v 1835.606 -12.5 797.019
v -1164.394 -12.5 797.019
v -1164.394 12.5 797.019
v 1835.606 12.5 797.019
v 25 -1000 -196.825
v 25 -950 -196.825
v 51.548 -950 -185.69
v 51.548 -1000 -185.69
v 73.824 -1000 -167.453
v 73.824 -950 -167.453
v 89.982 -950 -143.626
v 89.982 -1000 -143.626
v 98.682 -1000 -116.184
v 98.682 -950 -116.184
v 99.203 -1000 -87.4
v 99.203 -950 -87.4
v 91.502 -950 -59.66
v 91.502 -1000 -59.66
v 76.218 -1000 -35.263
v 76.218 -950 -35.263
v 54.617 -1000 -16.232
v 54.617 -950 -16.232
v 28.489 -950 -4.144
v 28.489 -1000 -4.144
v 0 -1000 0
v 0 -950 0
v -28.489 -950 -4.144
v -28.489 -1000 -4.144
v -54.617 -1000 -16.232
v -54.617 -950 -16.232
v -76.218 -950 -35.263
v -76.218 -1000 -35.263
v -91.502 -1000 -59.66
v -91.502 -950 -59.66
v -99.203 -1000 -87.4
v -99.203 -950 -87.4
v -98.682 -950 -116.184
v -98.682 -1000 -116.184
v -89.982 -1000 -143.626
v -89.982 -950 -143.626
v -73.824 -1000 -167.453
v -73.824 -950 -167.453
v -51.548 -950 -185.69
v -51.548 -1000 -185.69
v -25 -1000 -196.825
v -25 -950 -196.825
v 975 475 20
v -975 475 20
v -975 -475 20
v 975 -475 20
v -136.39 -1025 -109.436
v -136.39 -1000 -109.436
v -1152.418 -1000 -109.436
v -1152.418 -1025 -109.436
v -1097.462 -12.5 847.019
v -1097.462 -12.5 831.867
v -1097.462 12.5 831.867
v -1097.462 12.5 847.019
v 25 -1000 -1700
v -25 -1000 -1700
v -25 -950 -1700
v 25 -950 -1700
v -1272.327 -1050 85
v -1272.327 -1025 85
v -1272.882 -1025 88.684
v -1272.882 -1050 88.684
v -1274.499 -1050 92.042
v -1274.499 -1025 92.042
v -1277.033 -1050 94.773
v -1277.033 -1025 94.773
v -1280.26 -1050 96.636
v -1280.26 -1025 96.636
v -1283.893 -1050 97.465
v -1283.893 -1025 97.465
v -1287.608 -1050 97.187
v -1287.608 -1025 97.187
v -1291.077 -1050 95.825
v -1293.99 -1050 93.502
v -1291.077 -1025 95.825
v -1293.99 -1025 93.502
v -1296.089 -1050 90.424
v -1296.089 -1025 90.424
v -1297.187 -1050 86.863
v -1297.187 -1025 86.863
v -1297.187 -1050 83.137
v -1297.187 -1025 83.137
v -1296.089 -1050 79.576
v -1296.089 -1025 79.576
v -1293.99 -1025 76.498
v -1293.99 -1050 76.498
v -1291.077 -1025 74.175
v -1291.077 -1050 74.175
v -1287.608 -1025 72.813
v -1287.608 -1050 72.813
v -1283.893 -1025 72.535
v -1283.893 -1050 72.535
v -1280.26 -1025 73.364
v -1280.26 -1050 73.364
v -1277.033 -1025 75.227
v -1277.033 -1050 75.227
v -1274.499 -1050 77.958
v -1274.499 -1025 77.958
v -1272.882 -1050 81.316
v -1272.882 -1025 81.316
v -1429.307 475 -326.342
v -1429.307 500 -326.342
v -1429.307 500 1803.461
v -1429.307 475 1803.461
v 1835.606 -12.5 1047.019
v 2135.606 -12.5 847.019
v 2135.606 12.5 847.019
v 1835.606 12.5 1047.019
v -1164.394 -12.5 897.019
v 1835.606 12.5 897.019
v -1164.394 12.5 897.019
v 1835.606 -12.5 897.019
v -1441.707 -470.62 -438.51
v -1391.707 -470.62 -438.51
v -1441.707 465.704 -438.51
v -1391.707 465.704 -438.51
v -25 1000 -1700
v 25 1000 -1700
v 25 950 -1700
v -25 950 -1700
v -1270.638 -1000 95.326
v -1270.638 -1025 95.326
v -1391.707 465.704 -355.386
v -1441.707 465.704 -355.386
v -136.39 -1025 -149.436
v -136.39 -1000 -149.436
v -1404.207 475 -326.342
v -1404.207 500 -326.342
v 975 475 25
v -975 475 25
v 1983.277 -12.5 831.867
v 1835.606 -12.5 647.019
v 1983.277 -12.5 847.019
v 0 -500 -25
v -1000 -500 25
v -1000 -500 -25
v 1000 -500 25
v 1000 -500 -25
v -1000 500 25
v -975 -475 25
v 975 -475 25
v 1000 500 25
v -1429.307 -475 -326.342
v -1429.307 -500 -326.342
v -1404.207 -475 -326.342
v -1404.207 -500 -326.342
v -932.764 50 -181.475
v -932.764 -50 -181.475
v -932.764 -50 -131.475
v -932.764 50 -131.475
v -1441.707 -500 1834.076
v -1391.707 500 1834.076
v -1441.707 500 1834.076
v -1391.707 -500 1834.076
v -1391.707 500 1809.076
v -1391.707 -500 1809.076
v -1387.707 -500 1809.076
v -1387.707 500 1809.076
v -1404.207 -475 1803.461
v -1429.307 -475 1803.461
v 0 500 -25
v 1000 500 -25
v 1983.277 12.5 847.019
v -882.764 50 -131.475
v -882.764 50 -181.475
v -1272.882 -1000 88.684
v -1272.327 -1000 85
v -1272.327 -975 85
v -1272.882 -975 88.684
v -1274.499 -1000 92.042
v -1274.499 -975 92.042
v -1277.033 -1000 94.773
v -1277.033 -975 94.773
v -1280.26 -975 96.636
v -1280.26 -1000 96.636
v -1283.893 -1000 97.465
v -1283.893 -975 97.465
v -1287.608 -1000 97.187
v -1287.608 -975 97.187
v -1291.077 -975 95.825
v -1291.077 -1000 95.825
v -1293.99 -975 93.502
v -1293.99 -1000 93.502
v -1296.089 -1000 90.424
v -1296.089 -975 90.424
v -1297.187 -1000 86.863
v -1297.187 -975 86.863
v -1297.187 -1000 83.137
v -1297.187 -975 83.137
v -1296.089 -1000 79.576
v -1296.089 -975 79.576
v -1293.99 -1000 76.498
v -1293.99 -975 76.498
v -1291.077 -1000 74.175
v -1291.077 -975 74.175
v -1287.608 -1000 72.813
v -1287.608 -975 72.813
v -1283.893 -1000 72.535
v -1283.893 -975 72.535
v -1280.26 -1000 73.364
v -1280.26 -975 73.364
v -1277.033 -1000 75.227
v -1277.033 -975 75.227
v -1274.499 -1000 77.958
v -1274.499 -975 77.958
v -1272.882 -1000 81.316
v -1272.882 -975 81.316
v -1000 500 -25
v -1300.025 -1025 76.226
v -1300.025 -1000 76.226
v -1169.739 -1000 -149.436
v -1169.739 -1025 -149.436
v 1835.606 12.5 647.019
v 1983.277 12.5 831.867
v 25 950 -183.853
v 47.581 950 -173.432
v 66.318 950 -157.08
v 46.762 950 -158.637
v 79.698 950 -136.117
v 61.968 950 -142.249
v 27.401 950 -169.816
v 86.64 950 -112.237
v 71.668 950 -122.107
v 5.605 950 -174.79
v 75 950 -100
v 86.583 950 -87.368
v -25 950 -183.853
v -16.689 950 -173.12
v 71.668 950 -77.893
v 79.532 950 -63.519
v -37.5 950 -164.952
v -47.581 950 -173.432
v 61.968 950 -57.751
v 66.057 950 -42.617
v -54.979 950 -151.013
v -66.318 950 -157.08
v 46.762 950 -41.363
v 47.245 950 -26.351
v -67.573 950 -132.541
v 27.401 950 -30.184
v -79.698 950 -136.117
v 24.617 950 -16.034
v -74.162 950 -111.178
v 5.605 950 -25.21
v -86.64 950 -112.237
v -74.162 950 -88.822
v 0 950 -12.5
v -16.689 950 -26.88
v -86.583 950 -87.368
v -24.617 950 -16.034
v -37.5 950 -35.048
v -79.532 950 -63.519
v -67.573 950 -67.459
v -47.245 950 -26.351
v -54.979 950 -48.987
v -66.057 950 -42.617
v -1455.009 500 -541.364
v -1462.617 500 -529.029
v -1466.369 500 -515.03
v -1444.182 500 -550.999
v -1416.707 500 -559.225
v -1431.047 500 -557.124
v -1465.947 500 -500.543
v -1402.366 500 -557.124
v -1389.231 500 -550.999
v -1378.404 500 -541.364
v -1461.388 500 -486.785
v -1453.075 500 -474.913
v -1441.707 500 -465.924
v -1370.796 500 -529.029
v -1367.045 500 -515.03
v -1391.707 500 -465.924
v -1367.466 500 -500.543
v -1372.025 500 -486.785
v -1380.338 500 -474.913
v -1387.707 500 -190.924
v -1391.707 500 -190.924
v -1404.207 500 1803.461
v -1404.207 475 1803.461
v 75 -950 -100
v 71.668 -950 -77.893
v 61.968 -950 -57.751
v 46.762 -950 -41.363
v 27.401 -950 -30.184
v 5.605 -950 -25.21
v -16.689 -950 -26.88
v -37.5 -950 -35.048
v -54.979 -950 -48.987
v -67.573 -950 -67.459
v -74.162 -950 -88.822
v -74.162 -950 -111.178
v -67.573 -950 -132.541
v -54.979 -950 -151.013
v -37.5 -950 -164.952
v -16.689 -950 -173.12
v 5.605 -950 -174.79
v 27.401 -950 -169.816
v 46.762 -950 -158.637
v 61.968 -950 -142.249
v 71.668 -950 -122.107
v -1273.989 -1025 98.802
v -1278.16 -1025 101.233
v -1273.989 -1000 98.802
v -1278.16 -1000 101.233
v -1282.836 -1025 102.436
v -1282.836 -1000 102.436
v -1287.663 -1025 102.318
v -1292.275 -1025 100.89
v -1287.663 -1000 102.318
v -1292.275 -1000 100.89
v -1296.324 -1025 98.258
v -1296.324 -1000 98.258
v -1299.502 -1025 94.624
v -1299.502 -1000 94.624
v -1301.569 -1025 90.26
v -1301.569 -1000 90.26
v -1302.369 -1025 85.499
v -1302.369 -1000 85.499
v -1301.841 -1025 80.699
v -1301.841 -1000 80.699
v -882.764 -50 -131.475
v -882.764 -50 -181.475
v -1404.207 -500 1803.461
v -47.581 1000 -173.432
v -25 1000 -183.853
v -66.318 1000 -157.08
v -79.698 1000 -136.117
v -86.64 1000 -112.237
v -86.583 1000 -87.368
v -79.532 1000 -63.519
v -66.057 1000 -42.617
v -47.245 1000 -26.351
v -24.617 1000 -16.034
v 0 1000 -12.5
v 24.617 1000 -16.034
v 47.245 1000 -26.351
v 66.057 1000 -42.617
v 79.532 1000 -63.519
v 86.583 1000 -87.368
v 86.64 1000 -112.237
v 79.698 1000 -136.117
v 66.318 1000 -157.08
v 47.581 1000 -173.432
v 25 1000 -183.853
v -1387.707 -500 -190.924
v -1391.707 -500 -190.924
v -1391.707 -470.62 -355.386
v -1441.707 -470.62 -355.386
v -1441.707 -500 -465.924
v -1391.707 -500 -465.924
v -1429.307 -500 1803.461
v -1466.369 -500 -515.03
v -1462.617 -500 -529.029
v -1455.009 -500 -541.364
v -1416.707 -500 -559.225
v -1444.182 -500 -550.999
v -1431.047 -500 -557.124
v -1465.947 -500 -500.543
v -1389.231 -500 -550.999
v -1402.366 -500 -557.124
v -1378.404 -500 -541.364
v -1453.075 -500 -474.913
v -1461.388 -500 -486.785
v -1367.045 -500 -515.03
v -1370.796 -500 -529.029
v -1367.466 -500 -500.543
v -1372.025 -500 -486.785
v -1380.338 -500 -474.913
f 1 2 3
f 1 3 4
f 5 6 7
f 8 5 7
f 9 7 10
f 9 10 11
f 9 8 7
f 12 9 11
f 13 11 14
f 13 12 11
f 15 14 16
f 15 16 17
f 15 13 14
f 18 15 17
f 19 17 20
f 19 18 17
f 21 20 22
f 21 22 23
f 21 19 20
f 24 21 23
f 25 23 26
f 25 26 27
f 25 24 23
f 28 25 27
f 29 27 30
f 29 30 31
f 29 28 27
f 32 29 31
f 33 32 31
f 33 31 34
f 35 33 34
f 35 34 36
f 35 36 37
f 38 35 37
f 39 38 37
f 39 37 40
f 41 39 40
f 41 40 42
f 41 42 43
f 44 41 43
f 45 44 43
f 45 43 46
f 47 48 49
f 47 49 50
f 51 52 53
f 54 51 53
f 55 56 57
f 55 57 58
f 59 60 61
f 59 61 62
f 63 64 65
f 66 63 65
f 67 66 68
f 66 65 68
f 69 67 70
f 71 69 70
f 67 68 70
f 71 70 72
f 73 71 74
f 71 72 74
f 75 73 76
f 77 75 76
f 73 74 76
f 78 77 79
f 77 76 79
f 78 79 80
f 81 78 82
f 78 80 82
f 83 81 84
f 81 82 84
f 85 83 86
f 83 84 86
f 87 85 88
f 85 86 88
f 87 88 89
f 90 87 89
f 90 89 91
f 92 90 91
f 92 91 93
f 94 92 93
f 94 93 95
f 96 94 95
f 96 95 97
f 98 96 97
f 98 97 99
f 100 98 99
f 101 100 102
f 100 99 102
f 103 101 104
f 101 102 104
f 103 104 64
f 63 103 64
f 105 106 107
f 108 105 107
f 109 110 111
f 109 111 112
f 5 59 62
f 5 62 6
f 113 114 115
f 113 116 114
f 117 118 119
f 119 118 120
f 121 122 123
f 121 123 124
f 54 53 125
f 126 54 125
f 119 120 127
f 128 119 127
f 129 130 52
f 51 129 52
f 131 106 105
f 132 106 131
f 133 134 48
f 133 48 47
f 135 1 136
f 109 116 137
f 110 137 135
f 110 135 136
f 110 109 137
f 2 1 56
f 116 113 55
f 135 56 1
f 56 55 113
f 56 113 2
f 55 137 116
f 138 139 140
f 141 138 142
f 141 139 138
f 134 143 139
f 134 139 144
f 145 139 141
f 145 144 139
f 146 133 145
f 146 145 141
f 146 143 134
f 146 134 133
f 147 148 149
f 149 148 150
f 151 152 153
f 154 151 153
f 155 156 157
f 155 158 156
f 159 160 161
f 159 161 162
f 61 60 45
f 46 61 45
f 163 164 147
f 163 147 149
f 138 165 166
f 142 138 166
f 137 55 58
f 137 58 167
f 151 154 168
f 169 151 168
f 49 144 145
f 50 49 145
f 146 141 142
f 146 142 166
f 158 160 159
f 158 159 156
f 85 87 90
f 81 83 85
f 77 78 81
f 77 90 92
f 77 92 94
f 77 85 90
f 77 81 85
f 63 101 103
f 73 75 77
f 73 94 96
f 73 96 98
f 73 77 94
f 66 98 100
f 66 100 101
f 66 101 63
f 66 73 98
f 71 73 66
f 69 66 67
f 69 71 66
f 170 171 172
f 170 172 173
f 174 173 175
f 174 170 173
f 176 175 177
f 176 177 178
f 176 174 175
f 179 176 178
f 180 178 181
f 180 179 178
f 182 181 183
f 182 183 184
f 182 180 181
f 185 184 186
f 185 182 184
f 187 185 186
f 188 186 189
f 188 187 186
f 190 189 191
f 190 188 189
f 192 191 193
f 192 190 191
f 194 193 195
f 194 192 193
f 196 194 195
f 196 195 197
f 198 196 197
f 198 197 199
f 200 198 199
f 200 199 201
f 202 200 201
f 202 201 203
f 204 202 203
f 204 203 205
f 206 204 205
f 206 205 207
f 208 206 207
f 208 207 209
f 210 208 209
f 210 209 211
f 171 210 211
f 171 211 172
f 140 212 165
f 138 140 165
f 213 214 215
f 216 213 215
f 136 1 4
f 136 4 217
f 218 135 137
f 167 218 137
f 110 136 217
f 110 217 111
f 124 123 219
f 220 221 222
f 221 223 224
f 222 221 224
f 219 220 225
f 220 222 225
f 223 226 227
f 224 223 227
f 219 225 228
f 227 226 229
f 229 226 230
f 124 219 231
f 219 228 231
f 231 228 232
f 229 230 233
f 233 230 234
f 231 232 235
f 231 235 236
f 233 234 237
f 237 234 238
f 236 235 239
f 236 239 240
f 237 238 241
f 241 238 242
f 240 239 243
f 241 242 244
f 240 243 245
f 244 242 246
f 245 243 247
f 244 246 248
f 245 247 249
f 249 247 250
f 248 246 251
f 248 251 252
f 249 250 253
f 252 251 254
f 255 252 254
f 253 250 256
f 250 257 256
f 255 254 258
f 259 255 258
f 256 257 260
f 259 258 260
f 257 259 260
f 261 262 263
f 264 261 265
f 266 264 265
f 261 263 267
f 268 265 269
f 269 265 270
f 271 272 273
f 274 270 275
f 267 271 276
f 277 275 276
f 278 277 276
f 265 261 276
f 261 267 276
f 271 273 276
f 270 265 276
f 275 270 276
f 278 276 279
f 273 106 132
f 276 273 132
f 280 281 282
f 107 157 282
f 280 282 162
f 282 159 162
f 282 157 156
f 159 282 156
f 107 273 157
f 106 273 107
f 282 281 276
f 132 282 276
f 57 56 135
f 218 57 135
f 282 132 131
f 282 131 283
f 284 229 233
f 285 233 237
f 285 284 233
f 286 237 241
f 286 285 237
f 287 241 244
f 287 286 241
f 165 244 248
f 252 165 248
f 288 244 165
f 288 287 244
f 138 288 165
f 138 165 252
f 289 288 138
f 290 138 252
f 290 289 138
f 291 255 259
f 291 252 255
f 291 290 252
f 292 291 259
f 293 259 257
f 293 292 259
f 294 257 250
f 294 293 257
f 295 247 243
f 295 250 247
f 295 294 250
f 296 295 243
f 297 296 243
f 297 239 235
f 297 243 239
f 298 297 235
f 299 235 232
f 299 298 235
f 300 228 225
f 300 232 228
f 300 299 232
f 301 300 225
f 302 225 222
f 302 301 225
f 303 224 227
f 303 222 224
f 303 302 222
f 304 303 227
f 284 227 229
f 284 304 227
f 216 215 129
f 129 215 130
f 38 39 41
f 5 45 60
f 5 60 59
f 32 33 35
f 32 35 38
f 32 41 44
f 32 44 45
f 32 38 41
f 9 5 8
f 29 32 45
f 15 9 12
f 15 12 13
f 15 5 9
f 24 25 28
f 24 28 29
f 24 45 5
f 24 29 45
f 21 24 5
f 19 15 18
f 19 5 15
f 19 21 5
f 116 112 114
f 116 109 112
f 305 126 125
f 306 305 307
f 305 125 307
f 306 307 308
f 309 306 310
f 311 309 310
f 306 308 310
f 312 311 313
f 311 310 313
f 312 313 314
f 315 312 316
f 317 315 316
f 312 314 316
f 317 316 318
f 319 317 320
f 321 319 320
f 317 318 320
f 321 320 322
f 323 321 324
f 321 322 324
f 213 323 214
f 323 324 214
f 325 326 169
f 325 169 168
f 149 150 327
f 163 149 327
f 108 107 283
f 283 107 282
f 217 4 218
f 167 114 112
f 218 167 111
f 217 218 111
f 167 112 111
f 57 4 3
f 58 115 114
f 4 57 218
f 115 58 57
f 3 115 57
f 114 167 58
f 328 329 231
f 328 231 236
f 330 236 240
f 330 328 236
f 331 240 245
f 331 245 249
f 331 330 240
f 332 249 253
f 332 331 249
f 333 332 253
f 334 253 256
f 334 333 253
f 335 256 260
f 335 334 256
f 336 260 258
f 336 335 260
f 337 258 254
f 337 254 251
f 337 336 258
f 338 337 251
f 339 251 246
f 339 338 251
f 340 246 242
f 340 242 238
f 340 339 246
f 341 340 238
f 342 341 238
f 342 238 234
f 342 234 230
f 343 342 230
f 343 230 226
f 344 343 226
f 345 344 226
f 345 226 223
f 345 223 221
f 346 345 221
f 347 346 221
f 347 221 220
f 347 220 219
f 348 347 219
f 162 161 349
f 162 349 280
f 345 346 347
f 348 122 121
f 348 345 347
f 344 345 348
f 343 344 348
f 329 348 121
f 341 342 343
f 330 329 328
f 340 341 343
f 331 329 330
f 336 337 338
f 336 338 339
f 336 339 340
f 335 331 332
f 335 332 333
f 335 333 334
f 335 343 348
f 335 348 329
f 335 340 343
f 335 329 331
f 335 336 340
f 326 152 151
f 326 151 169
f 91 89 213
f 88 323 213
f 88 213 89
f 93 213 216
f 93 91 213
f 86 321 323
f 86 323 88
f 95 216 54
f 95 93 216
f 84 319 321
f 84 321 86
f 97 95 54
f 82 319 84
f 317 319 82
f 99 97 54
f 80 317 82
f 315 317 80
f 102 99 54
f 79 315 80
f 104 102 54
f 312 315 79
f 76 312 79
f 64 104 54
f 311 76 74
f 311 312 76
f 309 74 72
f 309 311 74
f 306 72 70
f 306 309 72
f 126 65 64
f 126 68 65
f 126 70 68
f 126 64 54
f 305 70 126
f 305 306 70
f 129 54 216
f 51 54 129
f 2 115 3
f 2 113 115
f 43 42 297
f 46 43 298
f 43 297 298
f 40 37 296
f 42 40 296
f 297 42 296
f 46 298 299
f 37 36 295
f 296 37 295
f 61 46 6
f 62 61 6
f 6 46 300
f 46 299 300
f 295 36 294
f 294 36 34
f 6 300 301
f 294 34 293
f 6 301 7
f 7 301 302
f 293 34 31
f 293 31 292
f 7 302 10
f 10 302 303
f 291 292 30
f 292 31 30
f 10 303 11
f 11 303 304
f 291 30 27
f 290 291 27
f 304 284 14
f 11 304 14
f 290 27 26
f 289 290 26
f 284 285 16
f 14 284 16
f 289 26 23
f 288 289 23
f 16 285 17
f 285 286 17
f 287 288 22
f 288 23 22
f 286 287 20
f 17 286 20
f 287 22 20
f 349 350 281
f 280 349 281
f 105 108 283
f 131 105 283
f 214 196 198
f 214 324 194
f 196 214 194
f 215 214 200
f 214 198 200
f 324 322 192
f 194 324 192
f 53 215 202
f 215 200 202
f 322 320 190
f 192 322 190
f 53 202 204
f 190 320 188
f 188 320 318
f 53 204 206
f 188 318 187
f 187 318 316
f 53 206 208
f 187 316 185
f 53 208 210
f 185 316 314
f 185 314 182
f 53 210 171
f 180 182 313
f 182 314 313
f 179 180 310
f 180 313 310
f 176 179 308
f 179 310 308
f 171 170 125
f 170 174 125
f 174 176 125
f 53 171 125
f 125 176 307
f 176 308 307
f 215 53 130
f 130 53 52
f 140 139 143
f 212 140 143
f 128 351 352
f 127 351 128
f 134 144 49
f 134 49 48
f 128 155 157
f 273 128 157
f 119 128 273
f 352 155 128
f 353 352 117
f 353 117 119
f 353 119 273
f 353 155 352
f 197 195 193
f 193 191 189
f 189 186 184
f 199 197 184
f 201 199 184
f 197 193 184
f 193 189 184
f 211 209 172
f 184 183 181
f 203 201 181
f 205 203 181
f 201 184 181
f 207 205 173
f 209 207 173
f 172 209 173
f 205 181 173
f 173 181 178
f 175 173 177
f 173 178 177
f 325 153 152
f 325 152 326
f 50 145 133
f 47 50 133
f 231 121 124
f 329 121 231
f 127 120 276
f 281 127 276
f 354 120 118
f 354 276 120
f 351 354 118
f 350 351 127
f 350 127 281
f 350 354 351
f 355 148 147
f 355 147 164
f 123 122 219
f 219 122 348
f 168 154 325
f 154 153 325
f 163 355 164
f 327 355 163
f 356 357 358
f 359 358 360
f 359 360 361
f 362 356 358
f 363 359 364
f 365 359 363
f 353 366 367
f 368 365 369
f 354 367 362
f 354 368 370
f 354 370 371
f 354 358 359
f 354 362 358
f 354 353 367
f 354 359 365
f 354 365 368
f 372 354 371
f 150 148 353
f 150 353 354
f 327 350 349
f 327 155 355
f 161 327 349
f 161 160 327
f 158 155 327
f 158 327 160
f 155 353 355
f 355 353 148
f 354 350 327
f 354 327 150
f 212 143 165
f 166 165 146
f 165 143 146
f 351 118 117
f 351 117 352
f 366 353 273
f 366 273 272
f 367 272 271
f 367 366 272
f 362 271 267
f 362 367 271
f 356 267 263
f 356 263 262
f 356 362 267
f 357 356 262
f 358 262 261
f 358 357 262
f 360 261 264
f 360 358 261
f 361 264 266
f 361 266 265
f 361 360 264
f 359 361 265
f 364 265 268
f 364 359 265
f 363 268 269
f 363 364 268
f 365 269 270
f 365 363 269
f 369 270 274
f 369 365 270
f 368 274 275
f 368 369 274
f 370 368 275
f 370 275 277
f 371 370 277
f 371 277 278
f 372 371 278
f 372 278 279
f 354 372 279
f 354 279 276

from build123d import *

# Parameters (mm, degrees)
F0_W           = 2000
F0_H           = 1000
F1_DEPTH       = 25
F2_W           = 1950
F2_H           = 950
F4_DEPTH       = 5
F5_R           = 75
F6_DEPTH       = 1000
F7_R           = 100
F7_R_2         = 75
F8_DEPTH       = 50
F9_W           = 50
F9_H           = 1600
F10_DEPTH      = 50
F11_R          = 87.5
F11_R_2        = 75
F12_DEPTH      = 50
F13_W          = 50
F13_H          = 1600
F14_DEPTH      = 50
F16_DEPTH      = 500
F17_W          = 25.1
F17_H          = 2129.8030083389
F18_DEPTH      = 25
F20_W          = 936.323851347
F20_H          = 83.1241309643
F21_DEPTH      = 75.001
F22_W          = 1000
F22_H          = 2000
F23_DEPTH      = 4
F24_R          = 12.5
F25_DEPTH      = 25
F26_R          = 12.5
F27_DEPTH      = 50
F27_DEPTH_BACK = 25
F29_DEPTH      = 12.5
F31_W          = 3080.738902092
F31_H          = 15.1523351669
F32_DEPTH      = 1012.501
F33_R          = 25
F34_DEPTH      = 50
F35_W          = 50
F35_H          = 50
F36_DEPTH      = 50


# Not quite as in the source:
# - a feature names something its author has since deleted; it is built from what else it names


with BuildPart() as f1:
    # F0 (on Top) → F1 (new body, symmetric)
    with BuildSketch(Plane.XY):
        Rectangle(F0_W, F0_H)
    extrude(amount=F1_DEPTH, both=True)

    # F2 (on face) → F4 (cut)
    with BuildSketch(Plane.XY.offset(25)):
        Rectangle(F2_W, F2_H)
    extrude(amount=-F4_DEPTH, mode=Mode.SUBTRACT)

    # F5 (on Front) → F6 (join, symmetric)
    with BuildSketch(Plane.XZ):
        with Locations((0, -100)):
            Circle(F5_R)
    extrude(amount=F6_DEPTH, both=True)

    # F7 (on face) → F8 (join)
    with BuildSketch(Plane.XZ.offset(1000)):
        with Locations((0, -100)):
            Circle(F7_R)
        with Locations((0, -100)):
            Circle(F7_R_2, mode=Mode.SUBTRACT)
    extrude(amount=-F8_DEPTH)

    # F9 (on face) → F10 (join)
    with BuildSketch(Plane.XZ.offset(1000)):
        with Locations((0, -900)):
            Rectangle(F9_W, F9_H)
    extrude(amount=-F10_DEPTH)

    # F11 (on face) → F12 (join)
    with BuildSketch(Plane(origin=(0, 1000, 0), x_dir=(-1, 0, 0), z_dir=(0, 1, 0))):
        with Locations((0, -100)):
            Circle(F11_R)
        with Locations((0, -100)):
            Circle(F11_R_2, mode=Mode.SUBTRACT)
    extrude(amount=-F12_DEPTH)

    # F13 (on face) → F14 (join)
    with BuildSketch(Plane(origin=(0, 1000, 0), x_dir=(-1, 0, 0), z_dir=(0, 1, 0))):
        with Locations((0, -900)):
            Rectangle(F13_W, F13_H)
    extrude(amount=-F14_DEPTH)


with BuildPart() as f16:
    # F15 (on Front) → F16 (new body, symmetric)
    with BuildSketch(Plane.XZ):
        with BuildLine():
            Line((-1441.7065932193, 1834.076336483), (-1441.7065932193, -465.923663517))
            ThreePointArc((-1441.7065932193, -465.923663517), (-1416.7065932193, -559.2249337063), (-1391.7065932193, -465.923663517))
            Line((-1391.7065932193, -465.923663517), (-1391.7065932193, 1834.076336483))
            Line((-1391.7065932193, 1834.076336483), (-1441.7065932193, 1834.076336483))
        make_face()
    extrude(amount=F16_DEPTH, both=True)

    # F17 (on face) → F18 (cut)
    with BuildSketch(Plane.XZ.offset(500)):
        with Locations((-1416.7565932193, 738.5590938225)):
            Rectangle(F17_W, F17_H)
    f18 = extrude(amount=-F18_DEPTH, mode=Mode.SUBTRACT)

    # F19: F18 across plane
    add(f18.mirror(Plane.XZ), mode=Mode.SUBTRACT)

    # F20 (on face) → F21 (cut, through all)
    with BuildSketch(Plane.YZ.offset(-1391.7065932193)):
        with Locations((-2.4584084749, -396.9483524561)):
            Rectangle(F20_W, F20_H)
    extrude(amount=-F21_DEPTH, mode=Mode.SUBTRACT)

    # F22 (on face) → F23 (join)
    with BuildSketch(Plane.YZ.offset(-1391.7065932193)):
        with Locations((0, 809.076336483)):
            Rectangle(F22_W, F22_H)
    extrude(amount=F23_DEPTH)


with BuildPart() as f25:
    # F24 (on face) → F25 (new body)
    with BuildSketch(Plane.XZ.offset(1000)):
        with BuildLine():
            Line((-136.3898057708, -149.4357743859), (-136.3898057708, -109.4357743859))
            Line((-136.3898057708, -109.4357743859), (-1152.4184524861, -109.4357743859))
            Line((-1152.4184524861, -109.4357743859), (-1270.6376314163, 95.3258499503))
            ThreePointArc((-1270.6376314163, 95.3258499503), (-1294.3903554093, 99.7139583837), (-1300.0246226155, 76.2256117888))
            Line((-1300.0246226155, 76.2256117888), (-1169.7389605618, -149.4357743859))
            Line((-1169.7389605618, -149.4357743859), (-136.3898057708, -149.4357743859))
        make_face()
        with Locations((-1284.8269364284, 85)):
            Circle(F24_R, mode=Mode.SUBTRACT)
    extrude(amount=F25_DEPTH)

    # F26 (on face) → F27 (join, two sides)
    with BuildSketch(Plane.XZ.offset(1025)) as f27_sk:
        with Locations((-1284.8269364284, 85)):
            Circle(F26_R)
    extrude(amount=-F27_DEPTH)
    extrude(f27_sk.sketch, amount=F27_DEPTH_BACK)


with BuildPart() as f29:
    # F28 (on Front) → F29 (new body, symmetric)
    with BuildSketch(Plane.XZ):
        Polygon((-1164.3936634064, 897.0192074776), (-1164.3936634064, 797.0192074776), (1835.6063365936, 797.0192074776), (1835.6063365936, 647.0192074776), (2135.6063365936, 847.0192074776), (1835.6063365936, 1047.0192074776), (1835.6063365936, 897.0192074776), align=None)
    extrude(amount=F29_DEPTH, both=True)

    # F31 (on face) → F32 (cut, through all)
    with BuildSketch(Plane.XZ.offset(12.5)):
        with Locations((442.9072737694, 839.4430398941)):
            Rectangle(F31_W, F31_H)
    extrude(amount=-F32_DEPTH, mode=Mode.SUBTRACT)


with BuildPart() as f34:
    # F33 (on Front) → F34 (new body, symmetric)
    with BuildSketch(Plane.XZ):
        with Locations((-900.4946947098, 269.2202627659)):
            Circle(F33_R)
    extrude(amount=F34_DEPTH, both=True)


with BuildPart() as f36:
    # F35 (on Front) → F36 (new body, symmetric)
    with BuildSketch(Plane.XZ):
        with Locations((-907.7636889409, -156.4750745893)):
            Rectangle(F35_W, F35_H)
    extrude(amount=F36_DEPTH, both=True)


solid = Compound([f1.part, f16.part, f25.part, f29.part, f36.part])
